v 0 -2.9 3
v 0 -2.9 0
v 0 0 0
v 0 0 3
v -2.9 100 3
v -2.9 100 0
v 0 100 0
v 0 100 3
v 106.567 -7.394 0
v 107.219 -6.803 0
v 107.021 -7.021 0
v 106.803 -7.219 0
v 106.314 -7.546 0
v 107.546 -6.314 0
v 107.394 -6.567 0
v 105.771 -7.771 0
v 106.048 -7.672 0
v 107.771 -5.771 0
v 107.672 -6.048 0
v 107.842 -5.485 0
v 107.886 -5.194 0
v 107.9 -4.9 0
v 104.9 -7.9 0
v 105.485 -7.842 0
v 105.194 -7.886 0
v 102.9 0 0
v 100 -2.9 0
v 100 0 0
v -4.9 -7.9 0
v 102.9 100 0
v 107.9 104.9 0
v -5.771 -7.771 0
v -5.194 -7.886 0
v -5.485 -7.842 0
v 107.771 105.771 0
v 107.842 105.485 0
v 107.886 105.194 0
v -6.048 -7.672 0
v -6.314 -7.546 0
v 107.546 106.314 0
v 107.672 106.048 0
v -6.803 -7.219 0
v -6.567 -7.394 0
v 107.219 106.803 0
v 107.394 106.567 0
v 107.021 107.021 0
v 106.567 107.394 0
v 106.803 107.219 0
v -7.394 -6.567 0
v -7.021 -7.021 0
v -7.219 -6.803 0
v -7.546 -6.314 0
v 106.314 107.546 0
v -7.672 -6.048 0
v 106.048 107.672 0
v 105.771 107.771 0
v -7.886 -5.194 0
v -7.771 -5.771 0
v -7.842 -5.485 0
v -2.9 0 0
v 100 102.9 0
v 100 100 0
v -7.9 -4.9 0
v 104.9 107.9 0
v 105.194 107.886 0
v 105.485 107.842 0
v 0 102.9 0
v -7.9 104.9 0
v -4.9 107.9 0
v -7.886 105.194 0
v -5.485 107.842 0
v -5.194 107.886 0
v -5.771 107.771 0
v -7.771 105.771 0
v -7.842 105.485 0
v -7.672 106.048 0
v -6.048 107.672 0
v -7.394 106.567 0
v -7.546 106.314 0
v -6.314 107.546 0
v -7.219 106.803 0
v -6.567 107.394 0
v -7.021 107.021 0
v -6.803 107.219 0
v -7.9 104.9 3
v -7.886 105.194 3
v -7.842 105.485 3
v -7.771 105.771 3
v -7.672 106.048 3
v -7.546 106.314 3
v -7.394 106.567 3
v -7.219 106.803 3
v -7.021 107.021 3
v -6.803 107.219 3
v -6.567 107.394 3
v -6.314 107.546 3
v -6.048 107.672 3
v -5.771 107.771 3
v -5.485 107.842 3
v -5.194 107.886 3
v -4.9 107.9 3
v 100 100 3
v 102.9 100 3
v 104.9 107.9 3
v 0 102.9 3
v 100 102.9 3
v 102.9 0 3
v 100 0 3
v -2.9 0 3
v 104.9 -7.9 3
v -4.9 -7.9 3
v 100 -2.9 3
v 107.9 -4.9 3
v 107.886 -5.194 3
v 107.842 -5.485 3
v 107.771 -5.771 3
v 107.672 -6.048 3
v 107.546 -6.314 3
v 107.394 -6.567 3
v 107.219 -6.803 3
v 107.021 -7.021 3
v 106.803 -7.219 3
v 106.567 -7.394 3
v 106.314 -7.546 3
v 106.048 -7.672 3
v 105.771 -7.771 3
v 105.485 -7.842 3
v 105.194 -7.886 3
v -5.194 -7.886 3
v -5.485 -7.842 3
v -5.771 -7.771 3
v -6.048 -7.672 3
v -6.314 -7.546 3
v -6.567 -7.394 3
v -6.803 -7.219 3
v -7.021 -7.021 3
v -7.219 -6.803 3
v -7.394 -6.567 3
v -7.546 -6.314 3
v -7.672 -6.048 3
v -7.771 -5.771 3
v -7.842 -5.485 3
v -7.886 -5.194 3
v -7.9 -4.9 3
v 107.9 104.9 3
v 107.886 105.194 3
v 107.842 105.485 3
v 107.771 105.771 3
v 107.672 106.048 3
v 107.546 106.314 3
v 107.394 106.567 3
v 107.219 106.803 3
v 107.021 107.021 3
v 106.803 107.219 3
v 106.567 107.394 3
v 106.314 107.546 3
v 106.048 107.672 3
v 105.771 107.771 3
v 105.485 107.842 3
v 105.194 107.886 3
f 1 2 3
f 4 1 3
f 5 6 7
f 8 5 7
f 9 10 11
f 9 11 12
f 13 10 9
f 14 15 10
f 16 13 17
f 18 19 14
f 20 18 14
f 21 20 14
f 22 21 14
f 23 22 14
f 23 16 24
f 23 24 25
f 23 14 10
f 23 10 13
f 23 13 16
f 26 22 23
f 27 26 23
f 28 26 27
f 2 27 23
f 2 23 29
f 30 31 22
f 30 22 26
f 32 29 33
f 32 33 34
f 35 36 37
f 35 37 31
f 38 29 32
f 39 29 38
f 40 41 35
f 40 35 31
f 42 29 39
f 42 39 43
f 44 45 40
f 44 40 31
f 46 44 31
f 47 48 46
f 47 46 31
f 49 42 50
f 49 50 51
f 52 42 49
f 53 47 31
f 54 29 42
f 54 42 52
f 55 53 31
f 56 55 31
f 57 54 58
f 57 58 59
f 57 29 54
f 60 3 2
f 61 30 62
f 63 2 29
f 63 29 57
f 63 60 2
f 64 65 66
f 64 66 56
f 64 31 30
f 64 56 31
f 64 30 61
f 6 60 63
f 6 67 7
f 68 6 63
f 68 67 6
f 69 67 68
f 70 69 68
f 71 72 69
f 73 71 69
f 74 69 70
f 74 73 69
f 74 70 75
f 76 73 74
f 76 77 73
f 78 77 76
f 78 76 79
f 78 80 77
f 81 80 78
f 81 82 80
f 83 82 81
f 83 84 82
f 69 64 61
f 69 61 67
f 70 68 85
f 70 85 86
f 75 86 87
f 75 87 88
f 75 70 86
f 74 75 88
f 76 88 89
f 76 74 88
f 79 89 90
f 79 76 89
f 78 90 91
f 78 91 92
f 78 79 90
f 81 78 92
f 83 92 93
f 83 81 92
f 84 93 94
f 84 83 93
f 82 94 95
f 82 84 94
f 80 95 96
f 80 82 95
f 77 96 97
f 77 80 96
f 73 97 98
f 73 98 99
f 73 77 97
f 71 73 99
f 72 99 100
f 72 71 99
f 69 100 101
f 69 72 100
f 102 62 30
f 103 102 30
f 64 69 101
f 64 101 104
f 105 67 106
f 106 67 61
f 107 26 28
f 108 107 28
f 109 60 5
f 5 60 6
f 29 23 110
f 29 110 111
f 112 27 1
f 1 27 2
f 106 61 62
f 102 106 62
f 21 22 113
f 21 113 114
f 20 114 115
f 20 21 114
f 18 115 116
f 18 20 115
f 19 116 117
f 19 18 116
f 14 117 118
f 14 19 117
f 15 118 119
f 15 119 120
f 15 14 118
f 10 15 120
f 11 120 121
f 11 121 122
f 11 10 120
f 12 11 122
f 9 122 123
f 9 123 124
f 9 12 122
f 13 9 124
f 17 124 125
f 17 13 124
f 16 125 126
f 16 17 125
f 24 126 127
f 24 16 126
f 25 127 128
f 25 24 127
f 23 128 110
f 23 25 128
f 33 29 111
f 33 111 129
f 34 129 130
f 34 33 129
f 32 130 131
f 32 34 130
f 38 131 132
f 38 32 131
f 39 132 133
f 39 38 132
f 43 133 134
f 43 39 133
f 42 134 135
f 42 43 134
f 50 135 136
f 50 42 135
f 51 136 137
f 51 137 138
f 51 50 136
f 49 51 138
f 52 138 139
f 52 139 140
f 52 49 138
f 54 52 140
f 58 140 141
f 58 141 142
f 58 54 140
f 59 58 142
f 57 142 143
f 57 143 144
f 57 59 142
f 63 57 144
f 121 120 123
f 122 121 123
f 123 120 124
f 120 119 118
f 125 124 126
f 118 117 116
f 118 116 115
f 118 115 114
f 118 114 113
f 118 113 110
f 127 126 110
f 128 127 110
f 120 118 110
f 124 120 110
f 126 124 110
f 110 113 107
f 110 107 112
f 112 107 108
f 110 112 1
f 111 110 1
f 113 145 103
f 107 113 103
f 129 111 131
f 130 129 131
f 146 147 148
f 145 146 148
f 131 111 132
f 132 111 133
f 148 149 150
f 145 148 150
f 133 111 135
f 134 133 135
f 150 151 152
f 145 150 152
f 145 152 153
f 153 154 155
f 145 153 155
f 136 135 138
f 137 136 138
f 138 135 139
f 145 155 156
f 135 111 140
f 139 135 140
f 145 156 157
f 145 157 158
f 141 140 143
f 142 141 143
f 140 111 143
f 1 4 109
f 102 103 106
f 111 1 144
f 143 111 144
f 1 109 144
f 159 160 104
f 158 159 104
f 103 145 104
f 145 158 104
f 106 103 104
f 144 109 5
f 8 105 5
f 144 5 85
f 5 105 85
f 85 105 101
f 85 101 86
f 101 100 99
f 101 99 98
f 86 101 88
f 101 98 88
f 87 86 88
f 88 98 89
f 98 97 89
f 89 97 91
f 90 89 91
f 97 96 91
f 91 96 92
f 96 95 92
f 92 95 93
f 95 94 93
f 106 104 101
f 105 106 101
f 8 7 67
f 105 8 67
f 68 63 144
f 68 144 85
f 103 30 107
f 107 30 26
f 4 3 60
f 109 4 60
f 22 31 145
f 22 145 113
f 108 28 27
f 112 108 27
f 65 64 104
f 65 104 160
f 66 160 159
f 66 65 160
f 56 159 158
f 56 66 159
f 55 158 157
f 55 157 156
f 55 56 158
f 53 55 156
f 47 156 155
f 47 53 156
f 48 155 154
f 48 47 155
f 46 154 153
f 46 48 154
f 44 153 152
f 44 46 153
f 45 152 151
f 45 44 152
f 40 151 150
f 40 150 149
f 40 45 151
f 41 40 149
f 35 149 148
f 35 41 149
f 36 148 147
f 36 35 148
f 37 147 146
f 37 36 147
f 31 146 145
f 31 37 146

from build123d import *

# Parameters (mm, degrees)
EXTRUDE_1_DEPTH = 3


with BuildPart() as part:
    # 草图1 → 凸台-拉伸1 (new body)
    with BuildSketch(Plane.XY):
        with BuildLine():
            Line((-4.9, 107.9), (104.9, 107.9))
            ThreePointArc((104.9, 107.9), (107.021320344, 107.021320344), (107.9, 104.9))
            Line((107.9, 104.9), (107.9, -4.9))
            ThreePointArc((107.9, -4.9), (107.021320344, -7.021320344), (104.9, -7.9))
            Line((104.9, -7.9), (-4.9, -7.9))
            ThreePointArc((-4.9, -7.9), (-7.021320344, -7.021320344), (-7.9, -4.9))
            Line((-7.9, -4.9), (-7.9, 104.9))
            ThreePointArc((-7.9, 104.9), (-7.021320344, 107.021320344), (-4.9, 107.9))
        make_face()
        Polygon((100, -2.9), (0, -2.9), (0, 0), (-2.9, 0), (-2.9, 100), (0, 100), (0, 102.9), (100, 102.9), (100, 100), (102.9, 100), (102.9, 0), (100, 0), align=None, mode=Mode.SUBTRACT)
    extrude(amount=EXTRUDE_1_DEPTH)


solid = part.part
